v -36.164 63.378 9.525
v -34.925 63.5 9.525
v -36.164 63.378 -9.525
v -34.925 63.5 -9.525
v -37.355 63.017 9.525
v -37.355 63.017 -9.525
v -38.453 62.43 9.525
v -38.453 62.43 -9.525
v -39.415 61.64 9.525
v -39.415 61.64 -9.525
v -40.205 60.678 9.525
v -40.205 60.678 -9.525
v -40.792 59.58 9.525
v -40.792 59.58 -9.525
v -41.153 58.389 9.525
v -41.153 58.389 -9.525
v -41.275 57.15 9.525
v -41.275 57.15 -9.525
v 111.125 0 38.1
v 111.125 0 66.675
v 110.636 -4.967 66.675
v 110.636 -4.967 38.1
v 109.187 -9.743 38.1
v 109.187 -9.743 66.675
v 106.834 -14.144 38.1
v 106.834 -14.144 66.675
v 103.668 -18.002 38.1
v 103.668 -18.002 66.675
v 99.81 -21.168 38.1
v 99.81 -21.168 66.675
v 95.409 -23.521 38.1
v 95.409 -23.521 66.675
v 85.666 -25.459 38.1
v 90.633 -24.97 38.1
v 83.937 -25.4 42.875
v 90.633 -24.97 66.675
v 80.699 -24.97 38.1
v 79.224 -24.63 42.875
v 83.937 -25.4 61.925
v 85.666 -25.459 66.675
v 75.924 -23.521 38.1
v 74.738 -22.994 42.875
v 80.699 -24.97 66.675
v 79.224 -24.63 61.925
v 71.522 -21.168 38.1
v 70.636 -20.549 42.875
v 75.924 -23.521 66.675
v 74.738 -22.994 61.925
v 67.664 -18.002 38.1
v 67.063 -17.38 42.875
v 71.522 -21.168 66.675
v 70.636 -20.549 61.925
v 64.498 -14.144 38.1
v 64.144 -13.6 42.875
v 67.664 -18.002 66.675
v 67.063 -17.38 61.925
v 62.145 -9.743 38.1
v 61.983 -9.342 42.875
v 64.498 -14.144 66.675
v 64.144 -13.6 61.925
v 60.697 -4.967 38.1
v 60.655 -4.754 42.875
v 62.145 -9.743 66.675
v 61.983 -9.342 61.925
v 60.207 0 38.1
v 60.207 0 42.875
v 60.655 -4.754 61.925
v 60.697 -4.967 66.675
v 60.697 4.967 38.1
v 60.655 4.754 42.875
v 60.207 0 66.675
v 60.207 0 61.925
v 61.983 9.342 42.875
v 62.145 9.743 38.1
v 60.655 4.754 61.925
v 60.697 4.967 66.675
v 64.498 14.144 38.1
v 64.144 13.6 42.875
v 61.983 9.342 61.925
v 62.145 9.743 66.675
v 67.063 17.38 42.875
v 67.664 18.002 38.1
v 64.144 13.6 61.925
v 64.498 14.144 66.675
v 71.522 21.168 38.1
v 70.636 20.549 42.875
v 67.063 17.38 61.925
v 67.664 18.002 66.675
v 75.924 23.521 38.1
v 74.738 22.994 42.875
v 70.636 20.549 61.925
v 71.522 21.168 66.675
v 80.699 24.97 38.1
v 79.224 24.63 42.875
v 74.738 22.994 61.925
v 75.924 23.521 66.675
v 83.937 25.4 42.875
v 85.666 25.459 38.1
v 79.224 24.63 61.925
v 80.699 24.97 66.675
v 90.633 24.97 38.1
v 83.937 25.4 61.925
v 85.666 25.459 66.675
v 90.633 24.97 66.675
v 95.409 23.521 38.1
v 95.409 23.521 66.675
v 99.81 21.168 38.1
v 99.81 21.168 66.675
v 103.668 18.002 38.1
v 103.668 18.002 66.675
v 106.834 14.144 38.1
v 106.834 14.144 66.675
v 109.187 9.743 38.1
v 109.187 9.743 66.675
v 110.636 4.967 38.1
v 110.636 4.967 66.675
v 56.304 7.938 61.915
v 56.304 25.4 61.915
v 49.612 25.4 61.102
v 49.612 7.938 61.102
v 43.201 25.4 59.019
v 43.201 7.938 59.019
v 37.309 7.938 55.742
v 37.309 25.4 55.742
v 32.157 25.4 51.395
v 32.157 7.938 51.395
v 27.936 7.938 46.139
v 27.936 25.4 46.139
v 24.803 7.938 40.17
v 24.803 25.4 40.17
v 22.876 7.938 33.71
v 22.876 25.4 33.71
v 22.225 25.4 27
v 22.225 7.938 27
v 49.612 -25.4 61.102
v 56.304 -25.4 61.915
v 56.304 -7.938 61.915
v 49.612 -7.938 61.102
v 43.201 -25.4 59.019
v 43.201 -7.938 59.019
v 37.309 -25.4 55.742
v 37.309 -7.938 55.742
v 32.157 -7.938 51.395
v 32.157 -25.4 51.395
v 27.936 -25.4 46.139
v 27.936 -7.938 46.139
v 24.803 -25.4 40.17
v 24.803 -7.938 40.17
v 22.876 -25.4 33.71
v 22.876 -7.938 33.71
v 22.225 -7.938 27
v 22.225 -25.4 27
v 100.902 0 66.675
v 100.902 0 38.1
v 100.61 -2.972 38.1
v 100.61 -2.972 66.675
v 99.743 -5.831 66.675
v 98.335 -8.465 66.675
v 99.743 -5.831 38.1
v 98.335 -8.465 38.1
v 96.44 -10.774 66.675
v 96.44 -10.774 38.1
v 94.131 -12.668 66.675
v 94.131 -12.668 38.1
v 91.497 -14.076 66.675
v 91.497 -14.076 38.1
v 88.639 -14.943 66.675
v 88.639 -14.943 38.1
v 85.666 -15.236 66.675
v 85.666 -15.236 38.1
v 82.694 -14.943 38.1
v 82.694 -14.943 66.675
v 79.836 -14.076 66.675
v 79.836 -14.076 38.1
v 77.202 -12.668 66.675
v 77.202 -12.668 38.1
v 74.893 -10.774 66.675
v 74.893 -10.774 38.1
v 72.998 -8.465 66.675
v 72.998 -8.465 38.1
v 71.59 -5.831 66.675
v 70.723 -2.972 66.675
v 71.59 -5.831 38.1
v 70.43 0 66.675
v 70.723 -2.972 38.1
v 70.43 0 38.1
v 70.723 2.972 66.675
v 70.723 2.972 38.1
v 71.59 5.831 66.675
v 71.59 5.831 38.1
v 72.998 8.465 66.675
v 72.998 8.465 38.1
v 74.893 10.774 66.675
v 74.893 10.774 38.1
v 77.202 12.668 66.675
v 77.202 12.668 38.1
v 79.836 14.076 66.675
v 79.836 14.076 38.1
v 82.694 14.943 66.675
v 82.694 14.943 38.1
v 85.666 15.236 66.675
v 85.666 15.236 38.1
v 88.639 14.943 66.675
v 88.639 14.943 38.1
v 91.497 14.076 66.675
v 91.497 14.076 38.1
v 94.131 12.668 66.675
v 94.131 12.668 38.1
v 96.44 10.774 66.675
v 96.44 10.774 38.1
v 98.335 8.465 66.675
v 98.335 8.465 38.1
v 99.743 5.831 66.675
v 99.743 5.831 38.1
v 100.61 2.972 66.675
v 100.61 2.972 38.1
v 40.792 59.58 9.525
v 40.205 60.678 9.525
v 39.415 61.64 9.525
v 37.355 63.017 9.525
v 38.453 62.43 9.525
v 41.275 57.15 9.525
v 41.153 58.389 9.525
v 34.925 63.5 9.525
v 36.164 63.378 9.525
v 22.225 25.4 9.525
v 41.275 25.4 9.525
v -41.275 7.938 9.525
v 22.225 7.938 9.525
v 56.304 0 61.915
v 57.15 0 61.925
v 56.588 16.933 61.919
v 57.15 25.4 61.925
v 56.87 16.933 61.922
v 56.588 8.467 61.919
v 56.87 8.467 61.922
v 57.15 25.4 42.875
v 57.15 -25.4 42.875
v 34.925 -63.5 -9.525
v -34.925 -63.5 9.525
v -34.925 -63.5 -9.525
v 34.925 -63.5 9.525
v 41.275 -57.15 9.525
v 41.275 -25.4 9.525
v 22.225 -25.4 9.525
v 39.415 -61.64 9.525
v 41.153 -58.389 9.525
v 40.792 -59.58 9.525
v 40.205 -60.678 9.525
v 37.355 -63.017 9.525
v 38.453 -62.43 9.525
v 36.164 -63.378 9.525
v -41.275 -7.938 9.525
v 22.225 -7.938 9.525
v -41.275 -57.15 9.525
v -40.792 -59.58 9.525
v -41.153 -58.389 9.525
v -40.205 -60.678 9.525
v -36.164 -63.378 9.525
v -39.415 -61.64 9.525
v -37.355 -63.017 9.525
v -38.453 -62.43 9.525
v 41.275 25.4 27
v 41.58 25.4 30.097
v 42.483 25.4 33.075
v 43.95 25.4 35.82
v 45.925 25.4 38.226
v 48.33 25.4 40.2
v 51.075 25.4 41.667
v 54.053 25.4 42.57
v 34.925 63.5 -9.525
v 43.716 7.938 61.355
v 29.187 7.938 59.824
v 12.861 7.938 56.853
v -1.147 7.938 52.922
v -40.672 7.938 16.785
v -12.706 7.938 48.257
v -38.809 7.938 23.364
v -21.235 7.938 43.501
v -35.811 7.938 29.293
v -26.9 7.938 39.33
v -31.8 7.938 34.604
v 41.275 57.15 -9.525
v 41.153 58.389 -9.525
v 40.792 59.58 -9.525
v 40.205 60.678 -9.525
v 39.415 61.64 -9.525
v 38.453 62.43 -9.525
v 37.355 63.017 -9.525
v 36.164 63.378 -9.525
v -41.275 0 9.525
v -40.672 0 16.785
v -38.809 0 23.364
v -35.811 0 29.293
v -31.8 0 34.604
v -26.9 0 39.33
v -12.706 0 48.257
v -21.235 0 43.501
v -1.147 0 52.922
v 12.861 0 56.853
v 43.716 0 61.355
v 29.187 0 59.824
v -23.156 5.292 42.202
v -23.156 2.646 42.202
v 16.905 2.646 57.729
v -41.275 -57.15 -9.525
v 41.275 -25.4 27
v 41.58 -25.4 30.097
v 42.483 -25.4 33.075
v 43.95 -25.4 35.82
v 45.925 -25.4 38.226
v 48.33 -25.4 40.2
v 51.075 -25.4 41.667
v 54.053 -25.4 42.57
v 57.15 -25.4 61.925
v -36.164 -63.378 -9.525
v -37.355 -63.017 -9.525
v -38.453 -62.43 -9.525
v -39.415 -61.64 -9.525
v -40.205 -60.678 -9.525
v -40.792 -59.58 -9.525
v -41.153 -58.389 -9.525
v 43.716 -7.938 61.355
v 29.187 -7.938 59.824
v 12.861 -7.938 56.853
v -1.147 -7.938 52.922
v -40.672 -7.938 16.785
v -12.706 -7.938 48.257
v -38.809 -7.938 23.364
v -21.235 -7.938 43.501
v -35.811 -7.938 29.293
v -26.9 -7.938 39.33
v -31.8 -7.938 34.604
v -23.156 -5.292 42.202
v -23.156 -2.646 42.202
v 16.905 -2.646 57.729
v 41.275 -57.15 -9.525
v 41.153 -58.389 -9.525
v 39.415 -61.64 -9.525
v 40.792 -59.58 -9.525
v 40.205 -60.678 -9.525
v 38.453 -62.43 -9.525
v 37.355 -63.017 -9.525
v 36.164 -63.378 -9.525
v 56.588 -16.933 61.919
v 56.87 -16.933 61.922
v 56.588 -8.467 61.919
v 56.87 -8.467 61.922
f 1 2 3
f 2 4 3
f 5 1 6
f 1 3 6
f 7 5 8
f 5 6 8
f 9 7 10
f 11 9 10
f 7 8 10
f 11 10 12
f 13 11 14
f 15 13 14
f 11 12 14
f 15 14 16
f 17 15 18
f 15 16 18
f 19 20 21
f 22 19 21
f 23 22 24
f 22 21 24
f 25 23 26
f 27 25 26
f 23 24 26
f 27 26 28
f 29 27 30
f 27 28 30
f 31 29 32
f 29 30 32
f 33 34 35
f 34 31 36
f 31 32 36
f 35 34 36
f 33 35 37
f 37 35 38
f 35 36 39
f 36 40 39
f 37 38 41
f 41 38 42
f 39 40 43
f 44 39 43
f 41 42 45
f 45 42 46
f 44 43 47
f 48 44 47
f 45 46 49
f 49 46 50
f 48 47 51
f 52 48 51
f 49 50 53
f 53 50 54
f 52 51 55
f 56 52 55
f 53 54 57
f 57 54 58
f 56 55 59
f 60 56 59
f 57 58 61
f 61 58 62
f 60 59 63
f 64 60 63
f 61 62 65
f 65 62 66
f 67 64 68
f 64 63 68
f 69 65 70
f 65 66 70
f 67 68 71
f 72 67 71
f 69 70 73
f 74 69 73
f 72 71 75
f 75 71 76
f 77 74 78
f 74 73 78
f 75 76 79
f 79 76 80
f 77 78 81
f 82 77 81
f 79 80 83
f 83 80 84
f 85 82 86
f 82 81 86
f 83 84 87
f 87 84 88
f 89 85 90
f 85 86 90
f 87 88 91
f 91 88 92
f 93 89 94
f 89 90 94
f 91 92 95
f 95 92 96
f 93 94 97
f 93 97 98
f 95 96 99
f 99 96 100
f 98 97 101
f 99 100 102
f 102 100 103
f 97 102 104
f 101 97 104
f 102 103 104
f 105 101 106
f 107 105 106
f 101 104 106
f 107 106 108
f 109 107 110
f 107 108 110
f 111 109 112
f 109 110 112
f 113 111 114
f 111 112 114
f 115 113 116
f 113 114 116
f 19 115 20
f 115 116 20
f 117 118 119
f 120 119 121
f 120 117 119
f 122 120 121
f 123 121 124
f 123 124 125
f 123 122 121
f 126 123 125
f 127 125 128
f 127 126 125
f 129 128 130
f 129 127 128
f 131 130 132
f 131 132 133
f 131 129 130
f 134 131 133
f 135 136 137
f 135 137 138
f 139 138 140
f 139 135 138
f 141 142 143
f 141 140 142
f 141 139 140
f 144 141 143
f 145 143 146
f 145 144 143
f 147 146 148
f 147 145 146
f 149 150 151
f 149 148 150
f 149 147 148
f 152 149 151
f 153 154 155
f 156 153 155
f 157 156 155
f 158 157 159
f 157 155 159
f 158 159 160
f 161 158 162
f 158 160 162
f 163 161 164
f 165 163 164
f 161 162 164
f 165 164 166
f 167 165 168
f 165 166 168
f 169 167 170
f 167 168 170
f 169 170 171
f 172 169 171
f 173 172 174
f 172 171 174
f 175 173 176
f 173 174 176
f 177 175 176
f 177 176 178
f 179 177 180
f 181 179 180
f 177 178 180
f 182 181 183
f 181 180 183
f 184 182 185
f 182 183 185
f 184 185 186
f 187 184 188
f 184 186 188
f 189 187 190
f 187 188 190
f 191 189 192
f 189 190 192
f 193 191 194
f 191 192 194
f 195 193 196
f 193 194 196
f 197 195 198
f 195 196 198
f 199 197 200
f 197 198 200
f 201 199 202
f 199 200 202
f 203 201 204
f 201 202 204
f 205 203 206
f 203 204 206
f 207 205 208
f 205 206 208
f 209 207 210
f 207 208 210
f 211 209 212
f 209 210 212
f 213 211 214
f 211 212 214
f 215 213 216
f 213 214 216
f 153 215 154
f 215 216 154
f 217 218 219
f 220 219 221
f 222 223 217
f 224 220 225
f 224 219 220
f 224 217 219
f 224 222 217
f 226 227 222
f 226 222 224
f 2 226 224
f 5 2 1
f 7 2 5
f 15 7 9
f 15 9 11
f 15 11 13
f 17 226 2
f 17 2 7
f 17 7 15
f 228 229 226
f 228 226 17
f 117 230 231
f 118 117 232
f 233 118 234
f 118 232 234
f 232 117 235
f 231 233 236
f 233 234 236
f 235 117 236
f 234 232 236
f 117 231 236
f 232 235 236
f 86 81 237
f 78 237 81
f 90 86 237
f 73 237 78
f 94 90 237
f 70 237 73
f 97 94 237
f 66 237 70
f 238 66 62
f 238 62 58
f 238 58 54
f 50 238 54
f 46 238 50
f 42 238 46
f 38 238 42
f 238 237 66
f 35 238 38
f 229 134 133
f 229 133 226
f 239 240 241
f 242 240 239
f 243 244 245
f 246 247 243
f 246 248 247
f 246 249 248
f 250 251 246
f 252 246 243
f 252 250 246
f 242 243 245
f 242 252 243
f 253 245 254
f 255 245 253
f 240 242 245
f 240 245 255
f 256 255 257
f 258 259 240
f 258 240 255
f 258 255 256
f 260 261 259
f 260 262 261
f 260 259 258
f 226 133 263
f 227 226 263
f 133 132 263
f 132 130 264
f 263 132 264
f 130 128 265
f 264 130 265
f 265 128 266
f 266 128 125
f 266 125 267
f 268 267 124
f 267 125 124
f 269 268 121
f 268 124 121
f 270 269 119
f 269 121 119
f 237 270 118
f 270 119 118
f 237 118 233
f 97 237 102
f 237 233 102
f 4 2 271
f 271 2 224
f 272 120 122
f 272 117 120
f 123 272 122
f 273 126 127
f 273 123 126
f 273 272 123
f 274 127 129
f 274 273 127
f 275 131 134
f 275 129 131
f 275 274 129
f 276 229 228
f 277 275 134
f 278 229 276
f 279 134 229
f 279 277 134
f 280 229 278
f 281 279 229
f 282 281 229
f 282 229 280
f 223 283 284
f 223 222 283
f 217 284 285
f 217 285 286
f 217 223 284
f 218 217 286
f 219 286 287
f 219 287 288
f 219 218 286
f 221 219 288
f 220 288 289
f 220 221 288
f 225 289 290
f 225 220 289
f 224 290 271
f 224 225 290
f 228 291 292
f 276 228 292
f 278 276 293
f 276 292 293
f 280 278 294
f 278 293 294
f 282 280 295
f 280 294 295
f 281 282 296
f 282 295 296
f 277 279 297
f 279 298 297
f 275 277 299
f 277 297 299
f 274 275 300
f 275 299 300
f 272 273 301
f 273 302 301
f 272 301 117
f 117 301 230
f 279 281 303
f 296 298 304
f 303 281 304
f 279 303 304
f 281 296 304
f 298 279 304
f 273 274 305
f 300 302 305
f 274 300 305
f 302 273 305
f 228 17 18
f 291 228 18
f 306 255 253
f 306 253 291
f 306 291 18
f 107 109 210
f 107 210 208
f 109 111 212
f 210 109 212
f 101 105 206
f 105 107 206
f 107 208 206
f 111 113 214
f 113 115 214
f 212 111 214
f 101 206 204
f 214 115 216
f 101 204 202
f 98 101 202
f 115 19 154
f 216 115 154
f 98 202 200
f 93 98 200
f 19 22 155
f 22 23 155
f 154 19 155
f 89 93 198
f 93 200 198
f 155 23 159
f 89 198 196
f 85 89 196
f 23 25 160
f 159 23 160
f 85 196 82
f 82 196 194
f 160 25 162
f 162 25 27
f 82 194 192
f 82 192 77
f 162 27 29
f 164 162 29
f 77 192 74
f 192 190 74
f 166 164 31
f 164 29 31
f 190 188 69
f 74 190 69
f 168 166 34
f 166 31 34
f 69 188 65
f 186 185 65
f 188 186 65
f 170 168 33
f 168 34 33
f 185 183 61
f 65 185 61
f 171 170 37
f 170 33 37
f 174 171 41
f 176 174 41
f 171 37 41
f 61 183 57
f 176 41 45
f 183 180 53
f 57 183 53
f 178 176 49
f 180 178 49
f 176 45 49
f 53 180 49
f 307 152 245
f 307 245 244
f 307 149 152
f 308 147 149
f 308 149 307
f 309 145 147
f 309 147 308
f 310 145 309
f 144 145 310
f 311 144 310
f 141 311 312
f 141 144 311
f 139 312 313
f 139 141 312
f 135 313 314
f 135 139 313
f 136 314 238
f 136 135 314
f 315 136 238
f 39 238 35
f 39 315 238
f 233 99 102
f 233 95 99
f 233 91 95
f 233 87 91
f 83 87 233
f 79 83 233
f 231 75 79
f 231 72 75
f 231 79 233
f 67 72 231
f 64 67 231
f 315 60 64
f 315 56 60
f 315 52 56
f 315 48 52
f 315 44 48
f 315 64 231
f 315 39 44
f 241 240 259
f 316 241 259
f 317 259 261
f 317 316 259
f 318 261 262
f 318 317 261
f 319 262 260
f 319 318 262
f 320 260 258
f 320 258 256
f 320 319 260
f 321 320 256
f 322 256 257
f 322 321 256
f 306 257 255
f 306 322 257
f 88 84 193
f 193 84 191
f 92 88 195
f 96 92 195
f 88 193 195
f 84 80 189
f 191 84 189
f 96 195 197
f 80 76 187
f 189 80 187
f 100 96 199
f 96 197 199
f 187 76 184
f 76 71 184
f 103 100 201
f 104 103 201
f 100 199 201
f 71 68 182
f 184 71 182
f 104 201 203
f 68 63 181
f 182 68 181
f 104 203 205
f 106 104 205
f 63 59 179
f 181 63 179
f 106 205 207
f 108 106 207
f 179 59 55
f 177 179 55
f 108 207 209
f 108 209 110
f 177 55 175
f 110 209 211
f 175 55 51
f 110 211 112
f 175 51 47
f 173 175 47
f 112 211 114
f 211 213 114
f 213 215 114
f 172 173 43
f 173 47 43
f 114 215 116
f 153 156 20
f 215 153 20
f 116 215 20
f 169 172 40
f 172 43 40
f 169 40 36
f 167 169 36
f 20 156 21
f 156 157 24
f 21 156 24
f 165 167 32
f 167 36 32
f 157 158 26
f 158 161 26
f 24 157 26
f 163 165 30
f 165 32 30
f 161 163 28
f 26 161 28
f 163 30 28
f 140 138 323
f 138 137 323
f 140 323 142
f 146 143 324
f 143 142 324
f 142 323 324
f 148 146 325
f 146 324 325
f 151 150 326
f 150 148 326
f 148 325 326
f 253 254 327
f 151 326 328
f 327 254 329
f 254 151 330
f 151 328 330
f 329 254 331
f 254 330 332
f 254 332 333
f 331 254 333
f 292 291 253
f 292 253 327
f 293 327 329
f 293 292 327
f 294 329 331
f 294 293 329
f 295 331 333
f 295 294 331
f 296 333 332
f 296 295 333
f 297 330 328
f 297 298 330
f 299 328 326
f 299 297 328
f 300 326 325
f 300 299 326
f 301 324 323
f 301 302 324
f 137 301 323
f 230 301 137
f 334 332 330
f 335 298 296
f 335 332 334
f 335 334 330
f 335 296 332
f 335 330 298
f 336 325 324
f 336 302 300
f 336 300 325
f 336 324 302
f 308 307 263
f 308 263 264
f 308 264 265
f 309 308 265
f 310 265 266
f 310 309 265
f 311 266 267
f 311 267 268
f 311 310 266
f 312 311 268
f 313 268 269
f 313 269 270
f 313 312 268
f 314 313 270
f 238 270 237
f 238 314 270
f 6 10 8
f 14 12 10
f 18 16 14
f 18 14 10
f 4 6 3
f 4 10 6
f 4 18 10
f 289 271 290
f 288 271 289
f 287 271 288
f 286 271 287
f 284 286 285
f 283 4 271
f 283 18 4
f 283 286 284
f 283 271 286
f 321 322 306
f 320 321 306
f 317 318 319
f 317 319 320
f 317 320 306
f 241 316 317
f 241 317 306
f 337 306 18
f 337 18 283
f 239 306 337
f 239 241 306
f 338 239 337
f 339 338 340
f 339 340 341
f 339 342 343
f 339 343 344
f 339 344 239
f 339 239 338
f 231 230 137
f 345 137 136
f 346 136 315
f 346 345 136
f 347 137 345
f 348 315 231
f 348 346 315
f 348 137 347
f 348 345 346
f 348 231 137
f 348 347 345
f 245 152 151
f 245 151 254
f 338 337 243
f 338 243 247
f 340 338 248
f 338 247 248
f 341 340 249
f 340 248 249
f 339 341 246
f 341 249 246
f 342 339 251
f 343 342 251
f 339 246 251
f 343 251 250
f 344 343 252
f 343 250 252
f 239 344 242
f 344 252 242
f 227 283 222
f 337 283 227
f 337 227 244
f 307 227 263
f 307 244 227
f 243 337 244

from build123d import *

# Parameters (mm, degrees)
F1_DEPTH = 63.5
F2_DEPTH = 7.9375
F0_W     = 25.341231811
F0_H     = 19.05
F3_DEPTH = 25.4
F5_R     = 6.35
F6_R     = 15.2361087042
F7_DEPTH = 28.575


with BuildPart() as f1:
    # F0 (on Front) → F1 (new body, symmetric)
    with BuildSketch(Plane.XZ):
        Polygon((-41.275, 9.525), (-41.275, -9.525), (41.275, -9.525), (41.275, 9.525), (22.225, 9.525), align=None)
    extrude(amount=F1_DEPTH, both=True)

    # F0 (on Front) → F2 (join, symmetric)
    with BuildSketch(Plane.XZ):
        with BuildLine():
            add(Edge.make_bspline(
                [(-41.275, 9.525), (-41.6624008036, 52.7132268151), (24.7713242394, 61.4626114939), (56.3040405334, 61.9149530076)],
                knots=[0, 0, 0, 0, 110.5062466574, 110.5062466574, 110.5062466574, 110.5062466574], degree=3))
            Line((-41.275, 9.525), (22.225, 9.525))
            Line((22.225, 9.525), (22.225, 27.0002))
            ThreePointArc((22.225, 27.0002), (32.1569933844, 51.3949790585), (56.3040405334, 61.9149530076))
        make_face()
    extrude(amount=F2_DEPTH, both=True)

    # F0 (on Front) → F3 (join, symmetric)
    with BuildSketch(Plane.XZ):
        with BuildLine():
            Line((22.225, 9.525), (41.275, 9.525))
            Line((41.275, 9.525), (41.275, 27.0002))
            ThreePointArc((41.275, 27.0002), (45.9246798487, 38.2255201513), (57.15, 42.8752))
            Line((57.15, 42.8752), (60.325, 42.8752))
            Line((60.325, 42.8752), (60.325, 61.9252))
            Line((60.325, 61.9252), (57.15, 61.9252))
            add(Edge.make_bspline(
                [(56.3040405334, 61.9149530076), (56.5889002651, 61.9190393629), (56.8709117518, 61.9224486028), (57.15, 61.9252)],
                knots=[110.5062466574, 110.5062466574, 110.5062466574, 110.5062466574, 111.5045361635, 111.5045361635, 111.5045361635, 111.5045361635], degree=3))
            ThreePointArc((56.3040405334, 61.9149530076), (32.1569933844, 51.3949790585), (22.225, 27.0002))
            Line((22.225, 27.0002), (22.225, 9.525))
        make_face()
        with Locations((72.9956159055, 52.4002)):
            Rectangle(F0_W, F0_H)
    extrude(amount=F3_DEPTH, both=True)

    # F0 (on Front) → F4 (revolve)
    with BuildSketch(Plane.XZ):
        Polygon((85.666231811, 66.675), (85.666231811, 61.9252), (85.666231811, 42.8752), (85.666231811, 38.1), (111.125, 38.1), (111.125, 66.675), align=None)
    revolve(axis=Axis((85.666231811, 0, 52.3875), (0, 0, -1)))

    # F5
    f5_edges = [f1.edges().sort_by_distance(p)[0] for p in [
        (-41.275, -63.5, 0),
        (41.275, -63.5, 0),
        (41.275, 63.5, 0),
        (-41.275, 63.5, 0),
    ]]
    fillet(f5_edges, radius=F5_R)

    # F6 (on face) → F7 (cut)
    with BuildSketch(Plane(origin=(0, 0, 38.1), x_dir=(1, 0, 0), z_dir=(0, 0, -1))):
        with Locations((85.666231811, 0)):
            Circle(F6_R)
    extrude(amount=-F7_DEPTH, mode=Mode.SUBTRACT)


solid = f1.part
